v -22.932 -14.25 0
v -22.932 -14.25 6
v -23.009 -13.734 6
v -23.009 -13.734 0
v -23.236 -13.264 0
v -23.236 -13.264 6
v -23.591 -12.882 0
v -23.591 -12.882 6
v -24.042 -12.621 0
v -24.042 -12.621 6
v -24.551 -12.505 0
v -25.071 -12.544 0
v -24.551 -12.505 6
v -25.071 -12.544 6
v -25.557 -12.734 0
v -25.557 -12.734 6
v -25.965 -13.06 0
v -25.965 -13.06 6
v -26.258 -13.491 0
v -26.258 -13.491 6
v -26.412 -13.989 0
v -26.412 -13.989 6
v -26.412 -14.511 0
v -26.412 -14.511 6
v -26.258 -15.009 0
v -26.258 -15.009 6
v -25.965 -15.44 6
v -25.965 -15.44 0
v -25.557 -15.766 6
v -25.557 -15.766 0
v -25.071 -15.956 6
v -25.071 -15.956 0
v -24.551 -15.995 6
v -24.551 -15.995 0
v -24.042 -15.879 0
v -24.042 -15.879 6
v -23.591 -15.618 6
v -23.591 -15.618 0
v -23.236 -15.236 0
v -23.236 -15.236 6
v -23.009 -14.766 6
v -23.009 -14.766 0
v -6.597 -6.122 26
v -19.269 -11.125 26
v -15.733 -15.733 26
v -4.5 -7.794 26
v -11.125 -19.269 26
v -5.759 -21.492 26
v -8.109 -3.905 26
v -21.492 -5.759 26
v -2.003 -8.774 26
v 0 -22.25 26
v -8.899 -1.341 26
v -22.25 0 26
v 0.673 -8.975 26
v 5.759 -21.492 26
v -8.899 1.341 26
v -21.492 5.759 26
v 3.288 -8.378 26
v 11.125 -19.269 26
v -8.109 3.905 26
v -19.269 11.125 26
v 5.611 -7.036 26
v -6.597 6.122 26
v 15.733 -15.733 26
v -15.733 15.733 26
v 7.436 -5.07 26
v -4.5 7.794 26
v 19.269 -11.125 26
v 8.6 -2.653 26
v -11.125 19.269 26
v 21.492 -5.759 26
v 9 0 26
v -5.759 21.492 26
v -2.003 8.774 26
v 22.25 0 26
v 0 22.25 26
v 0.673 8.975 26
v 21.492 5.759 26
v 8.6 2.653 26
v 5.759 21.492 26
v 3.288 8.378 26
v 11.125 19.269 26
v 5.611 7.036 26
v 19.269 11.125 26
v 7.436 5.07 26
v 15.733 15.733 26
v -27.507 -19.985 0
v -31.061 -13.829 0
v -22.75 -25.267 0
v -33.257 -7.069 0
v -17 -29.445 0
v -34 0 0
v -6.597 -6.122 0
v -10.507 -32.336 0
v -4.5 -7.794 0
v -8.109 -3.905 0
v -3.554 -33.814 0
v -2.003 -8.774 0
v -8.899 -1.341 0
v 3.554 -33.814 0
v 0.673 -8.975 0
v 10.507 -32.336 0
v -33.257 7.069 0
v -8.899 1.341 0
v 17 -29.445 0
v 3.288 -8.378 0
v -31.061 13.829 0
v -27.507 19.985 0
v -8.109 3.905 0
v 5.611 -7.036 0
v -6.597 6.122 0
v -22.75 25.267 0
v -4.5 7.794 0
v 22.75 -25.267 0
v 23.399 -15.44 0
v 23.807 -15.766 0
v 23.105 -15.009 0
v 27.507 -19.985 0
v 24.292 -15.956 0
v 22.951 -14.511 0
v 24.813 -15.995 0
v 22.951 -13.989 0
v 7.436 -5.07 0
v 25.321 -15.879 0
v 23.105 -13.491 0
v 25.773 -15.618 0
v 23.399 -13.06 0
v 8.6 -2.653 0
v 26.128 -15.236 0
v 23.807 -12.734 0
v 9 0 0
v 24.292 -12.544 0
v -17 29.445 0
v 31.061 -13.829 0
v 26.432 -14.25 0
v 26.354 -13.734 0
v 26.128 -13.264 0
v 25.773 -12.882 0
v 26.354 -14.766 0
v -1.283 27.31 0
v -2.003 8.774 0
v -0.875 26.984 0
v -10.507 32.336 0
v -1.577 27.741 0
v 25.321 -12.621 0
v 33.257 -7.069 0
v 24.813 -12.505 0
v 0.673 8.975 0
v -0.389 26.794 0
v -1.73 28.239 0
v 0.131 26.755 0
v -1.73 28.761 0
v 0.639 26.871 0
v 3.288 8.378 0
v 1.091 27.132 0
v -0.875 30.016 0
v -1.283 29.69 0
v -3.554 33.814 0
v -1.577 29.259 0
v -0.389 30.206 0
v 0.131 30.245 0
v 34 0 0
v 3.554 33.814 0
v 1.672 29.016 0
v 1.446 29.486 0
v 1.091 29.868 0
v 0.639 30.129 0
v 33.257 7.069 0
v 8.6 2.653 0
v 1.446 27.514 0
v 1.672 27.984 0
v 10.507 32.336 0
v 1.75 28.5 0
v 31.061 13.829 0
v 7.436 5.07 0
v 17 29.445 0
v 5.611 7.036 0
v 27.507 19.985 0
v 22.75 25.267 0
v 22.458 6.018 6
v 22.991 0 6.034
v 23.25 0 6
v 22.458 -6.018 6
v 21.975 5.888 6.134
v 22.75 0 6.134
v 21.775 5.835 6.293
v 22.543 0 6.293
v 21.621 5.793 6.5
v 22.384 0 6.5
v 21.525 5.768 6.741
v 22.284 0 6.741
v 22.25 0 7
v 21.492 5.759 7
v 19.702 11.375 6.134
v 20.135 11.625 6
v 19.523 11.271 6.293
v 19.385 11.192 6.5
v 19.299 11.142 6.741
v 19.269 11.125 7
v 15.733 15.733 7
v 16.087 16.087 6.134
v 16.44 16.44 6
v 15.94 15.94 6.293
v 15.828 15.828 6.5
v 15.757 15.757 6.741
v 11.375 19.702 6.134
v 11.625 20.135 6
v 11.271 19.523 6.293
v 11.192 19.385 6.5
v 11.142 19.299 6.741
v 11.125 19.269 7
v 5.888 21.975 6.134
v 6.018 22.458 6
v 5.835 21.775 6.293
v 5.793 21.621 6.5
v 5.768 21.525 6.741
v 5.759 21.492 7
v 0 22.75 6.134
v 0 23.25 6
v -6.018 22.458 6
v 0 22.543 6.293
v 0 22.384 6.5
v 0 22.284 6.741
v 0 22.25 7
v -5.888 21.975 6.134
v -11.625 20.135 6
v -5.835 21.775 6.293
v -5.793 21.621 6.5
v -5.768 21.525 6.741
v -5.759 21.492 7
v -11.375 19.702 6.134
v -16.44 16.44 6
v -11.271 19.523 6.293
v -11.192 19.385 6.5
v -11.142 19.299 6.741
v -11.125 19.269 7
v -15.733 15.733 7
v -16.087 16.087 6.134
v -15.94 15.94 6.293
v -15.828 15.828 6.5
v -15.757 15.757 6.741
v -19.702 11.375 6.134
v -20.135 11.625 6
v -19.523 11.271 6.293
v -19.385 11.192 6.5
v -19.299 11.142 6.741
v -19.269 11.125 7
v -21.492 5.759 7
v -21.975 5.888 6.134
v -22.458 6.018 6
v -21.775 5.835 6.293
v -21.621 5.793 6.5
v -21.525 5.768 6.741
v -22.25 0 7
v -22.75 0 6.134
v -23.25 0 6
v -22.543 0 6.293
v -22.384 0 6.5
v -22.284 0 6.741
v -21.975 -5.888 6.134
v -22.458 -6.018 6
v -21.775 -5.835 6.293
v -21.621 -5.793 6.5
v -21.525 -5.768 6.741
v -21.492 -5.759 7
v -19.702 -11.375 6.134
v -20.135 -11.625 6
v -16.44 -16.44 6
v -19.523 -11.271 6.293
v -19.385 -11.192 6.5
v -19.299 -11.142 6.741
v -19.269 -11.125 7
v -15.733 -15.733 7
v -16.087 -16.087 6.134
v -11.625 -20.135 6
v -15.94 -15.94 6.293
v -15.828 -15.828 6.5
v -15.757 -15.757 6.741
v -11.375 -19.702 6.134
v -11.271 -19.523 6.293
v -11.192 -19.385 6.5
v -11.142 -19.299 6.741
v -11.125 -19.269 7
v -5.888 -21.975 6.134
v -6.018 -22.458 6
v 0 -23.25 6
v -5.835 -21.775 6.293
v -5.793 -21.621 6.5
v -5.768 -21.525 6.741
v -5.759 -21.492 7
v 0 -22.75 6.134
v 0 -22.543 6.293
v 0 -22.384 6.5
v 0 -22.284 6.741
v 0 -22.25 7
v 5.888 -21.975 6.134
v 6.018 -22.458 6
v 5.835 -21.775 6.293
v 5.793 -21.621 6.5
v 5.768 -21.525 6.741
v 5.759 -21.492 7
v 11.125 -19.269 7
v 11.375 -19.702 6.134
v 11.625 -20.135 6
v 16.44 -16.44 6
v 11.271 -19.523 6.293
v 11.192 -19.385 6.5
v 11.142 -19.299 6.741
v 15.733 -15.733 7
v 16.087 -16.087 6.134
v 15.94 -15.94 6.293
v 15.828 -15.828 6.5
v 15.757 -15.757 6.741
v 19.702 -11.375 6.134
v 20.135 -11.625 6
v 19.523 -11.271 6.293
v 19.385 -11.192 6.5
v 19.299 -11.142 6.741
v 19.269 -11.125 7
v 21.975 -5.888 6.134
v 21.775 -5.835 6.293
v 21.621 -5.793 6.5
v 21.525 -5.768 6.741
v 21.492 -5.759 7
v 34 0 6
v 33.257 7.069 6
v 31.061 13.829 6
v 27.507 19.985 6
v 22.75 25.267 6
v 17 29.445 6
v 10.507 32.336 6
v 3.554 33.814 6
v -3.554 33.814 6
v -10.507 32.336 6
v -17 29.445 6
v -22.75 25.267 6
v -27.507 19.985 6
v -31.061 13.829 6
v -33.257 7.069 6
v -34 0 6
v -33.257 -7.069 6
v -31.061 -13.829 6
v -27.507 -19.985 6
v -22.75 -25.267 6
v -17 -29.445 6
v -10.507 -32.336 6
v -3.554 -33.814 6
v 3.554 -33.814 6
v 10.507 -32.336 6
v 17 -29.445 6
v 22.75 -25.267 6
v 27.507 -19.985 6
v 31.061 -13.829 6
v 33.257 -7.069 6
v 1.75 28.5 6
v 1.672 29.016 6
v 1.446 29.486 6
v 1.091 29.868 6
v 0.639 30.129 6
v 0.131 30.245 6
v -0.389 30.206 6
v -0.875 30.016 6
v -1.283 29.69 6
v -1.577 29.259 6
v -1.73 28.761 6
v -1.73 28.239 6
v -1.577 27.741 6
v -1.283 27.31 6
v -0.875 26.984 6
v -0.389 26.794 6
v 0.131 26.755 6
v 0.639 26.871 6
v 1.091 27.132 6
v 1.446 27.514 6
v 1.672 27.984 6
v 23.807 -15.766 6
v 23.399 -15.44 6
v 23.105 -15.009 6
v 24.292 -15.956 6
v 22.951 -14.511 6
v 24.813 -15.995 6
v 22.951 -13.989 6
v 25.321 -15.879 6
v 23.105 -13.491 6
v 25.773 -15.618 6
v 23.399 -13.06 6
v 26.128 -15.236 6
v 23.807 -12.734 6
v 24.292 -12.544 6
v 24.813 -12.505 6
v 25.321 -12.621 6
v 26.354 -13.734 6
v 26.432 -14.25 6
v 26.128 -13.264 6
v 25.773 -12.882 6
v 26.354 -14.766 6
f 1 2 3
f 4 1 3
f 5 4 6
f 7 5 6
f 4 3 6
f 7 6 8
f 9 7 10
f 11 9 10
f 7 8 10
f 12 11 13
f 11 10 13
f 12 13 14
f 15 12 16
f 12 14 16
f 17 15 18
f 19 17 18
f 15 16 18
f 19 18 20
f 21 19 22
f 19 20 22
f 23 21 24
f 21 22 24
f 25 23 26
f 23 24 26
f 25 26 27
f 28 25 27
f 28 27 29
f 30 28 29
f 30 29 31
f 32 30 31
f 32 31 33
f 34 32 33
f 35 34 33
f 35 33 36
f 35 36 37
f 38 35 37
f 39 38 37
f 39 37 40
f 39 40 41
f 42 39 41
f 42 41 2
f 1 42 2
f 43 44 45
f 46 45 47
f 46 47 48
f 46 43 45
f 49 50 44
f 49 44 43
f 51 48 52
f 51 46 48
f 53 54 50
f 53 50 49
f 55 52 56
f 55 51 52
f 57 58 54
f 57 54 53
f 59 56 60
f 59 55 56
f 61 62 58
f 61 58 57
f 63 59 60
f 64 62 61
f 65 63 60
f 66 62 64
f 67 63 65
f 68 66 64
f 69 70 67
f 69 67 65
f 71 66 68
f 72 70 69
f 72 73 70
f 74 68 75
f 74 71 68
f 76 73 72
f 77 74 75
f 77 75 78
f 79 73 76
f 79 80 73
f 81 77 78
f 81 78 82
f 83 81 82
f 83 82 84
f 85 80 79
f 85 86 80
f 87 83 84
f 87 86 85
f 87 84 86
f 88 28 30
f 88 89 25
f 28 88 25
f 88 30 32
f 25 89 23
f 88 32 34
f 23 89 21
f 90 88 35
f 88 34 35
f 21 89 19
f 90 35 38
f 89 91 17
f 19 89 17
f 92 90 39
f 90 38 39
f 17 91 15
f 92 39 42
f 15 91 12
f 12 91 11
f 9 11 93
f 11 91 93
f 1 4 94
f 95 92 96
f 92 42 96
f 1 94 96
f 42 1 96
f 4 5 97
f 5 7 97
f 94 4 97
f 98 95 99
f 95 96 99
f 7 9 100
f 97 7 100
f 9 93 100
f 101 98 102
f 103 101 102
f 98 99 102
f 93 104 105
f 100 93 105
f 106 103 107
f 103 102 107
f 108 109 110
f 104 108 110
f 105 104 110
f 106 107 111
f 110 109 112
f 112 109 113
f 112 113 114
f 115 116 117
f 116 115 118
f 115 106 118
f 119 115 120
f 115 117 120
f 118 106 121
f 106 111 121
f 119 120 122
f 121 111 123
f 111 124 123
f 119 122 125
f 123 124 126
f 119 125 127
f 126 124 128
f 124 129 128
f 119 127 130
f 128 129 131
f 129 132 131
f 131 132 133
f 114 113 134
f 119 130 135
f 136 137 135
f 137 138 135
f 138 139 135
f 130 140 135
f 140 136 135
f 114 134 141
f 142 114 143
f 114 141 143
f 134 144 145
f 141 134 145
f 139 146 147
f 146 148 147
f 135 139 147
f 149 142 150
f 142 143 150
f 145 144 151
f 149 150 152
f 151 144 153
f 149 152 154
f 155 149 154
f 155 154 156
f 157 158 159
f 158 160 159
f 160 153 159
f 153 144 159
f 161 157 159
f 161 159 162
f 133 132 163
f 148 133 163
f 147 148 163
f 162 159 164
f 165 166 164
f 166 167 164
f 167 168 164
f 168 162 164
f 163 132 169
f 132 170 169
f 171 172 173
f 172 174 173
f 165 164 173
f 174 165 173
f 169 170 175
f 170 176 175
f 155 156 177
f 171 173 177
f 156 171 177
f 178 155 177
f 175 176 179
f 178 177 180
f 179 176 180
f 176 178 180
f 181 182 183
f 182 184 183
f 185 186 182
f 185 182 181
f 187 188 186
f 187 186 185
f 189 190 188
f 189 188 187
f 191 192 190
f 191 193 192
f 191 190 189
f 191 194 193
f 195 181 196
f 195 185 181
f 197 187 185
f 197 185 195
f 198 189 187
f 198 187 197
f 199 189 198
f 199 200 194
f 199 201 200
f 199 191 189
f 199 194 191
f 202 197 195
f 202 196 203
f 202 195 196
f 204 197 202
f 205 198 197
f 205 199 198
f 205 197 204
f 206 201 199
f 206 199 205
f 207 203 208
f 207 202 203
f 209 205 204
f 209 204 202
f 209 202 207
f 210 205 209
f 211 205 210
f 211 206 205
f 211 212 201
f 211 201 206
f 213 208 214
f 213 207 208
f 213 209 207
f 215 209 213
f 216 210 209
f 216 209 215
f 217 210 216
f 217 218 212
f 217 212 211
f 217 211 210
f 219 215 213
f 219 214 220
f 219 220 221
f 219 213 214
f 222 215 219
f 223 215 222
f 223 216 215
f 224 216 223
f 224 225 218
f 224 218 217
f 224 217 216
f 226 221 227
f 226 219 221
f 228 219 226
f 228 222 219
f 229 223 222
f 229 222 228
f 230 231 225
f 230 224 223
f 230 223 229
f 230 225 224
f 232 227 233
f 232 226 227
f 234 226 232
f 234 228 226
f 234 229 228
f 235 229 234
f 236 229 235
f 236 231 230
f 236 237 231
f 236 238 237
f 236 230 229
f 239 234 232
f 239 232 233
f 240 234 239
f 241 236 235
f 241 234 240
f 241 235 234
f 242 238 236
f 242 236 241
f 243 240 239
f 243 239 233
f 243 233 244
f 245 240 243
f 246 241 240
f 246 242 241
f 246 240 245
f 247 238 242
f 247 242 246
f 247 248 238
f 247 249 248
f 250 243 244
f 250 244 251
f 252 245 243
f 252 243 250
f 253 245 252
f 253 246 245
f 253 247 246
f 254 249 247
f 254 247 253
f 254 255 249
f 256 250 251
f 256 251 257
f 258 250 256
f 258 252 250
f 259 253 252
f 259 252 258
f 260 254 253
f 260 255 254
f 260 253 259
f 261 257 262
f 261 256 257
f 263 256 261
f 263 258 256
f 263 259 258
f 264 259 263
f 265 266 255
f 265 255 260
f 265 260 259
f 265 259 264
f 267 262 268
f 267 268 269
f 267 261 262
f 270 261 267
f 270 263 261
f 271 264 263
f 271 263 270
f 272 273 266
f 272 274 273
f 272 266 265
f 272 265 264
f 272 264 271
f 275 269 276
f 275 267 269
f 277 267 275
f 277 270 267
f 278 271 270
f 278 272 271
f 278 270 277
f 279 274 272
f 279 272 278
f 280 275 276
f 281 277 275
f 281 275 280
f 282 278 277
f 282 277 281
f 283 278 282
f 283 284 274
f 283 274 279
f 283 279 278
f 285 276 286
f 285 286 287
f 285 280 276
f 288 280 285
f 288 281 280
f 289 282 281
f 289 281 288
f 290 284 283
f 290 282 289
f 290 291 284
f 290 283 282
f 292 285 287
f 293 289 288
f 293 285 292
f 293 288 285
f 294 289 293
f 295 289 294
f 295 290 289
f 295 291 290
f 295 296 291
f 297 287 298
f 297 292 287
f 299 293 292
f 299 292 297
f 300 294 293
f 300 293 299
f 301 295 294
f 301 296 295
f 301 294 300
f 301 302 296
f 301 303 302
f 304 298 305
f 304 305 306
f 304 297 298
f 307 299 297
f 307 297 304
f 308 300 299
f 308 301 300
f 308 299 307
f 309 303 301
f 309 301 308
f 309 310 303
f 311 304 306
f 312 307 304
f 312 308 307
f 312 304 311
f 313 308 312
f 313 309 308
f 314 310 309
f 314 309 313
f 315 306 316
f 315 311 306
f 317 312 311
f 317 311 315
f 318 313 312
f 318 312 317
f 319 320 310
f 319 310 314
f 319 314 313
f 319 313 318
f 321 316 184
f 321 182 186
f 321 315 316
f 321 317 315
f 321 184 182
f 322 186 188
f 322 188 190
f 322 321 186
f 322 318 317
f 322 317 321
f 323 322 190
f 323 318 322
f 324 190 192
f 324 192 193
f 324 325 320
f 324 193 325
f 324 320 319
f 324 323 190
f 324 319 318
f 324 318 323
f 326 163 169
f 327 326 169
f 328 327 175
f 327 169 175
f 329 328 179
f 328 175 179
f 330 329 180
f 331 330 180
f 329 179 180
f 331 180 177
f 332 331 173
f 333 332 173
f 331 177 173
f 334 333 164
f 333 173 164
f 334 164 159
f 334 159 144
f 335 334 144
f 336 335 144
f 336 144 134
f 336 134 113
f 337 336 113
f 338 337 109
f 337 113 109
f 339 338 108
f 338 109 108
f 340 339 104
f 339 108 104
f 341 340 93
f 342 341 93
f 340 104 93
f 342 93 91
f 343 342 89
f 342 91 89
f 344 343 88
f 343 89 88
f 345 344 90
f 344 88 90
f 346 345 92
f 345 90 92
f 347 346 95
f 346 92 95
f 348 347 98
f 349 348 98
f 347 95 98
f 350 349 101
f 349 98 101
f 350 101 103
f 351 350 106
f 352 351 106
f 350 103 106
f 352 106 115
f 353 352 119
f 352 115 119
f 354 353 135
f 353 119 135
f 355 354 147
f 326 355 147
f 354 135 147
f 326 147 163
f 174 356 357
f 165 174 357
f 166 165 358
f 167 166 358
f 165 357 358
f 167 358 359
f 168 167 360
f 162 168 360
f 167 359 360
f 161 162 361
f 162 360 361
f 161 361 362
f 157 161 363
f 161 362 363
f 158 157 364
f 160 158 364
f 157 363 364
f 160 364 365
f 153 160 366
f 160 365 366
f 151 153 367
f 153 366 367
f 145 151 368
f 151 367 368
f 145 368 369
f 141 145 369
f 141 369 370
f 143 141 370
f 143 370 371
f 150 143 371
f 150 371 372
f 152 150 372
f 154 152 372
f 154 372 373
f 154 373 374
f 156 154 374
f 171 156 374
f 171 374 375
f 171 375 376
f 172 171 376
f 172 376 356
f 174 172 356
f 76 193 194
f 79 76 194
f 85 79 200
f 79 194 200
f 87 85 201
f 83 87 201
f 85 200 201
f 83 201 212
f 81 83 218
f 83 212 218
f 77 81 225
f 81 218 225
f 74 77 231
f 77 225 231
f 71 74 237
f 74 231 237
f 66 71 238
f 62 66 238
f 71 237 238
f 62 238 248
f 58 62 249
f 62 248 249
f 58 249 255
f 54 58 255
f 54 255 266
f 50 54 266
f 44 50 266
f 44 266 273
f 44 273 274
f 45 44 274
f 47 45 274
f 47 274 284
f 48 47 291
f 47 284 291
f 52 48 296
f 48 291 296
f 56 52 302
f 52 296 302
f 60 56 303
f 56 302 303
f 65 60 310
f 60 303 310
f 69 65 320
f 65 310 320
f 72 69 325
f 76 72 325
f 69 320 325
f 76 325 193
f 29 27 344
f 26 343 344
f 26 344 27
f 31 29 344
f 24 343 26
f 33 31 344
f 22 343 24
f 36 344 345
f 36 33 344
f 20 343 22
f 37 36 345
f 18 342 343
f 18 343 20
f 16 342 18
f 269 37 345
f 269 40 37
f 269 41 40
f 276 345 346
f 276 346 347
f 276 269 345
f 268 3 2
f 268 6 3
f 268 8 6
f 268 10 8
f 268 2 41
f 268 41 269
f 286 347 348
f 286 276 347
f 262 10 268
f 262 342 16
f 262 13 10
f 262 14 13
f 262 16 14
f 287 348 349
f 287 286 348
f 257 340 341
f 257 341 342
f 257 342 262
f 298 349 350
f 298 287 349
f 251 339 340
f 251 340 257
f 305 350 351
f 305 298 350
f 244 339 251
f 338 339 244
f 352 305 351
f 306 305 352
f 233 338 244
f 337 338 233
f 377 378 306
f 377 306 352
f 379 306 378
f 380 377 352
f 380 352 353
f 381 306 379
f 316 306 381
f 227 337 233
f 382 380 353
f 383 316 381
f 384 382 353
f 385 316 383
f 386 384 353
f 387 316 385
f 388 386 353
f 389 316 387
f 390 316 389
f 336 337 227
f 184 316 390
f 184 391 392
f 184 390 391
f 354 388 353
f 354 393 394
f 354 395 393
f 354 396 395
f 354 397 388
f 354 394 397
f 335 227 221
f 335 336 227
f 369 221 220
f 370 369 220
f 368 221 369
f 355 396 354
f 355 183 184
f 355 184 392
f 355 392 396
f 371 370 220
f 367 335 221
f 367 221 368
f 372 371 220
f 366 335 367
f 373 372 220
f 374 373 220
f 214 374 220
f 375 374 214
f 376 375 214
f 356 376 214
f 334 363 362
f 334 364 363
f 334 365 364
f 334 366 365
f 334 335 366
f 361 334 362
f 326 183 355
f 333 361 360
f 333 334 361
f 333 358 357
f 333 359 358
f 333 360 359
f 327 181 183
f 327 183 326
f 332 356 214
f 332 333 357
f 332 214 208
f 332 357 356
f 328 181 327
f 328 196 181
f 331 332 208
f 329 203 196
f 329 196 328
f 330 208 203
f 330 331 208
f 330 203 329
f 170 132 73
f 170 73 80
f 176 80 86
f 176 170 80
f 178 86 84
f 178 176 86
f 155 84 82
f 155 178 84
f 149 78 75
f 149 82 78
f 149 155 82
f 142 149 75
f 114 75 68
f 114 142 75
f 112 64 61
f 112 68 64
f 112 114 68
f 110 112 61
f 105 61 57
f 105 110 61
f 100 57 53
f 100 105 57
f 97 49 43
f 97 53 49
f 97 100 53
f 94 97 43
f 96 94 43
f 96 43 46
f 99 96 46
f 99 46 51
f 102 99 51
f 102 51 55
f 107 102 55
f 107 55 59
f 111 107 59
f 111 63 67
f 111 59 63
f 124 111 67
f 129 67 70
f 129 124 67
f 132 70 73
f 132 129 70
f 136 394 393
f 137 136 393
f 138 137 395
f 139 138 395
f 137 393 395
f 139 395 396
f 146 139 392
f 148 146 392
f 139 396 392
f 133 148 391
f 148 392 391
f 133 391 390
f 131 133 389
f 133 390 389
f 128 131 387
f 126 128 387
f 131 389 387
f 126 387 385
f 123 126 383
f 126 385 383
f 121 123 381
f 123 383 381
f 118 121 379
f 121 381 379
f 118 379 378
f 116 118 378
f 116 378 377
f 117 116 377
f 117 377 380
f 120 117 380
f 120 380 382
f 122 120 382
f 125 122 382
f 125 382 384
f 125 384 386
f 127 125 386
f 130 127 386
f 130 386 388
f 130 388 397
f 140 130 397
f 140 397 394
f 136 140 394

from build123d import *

# Parameters (mm, degrees)
SKETCH_1_R                 = 34
EXTRUDE_252_DEPTH          = 6
SKETCH_2_R                 = 22.25
EXTRUDE_346_DEPTH          = 20
SKETCH_4_R                 = 1.75
CUT_EXTRUDE_656_DEPTH      = 53.076866265
FILLET_1_R                 = 1
CUT_EXTRUDE_770_DEPTH      = 55.662601475
CUT_EXTRUDE_770_DEPTH_BACK = 55.662601475
SKETCH_3_R                 = 9


with BuildPart() as part:
    # 草图1 → Extrude 252 (new body)
    with BuildSketch(Plane.XY):
        Circle(SKETCH_1_R)
    extrude(amount=EXTRUDE_252_DEPTH)

    # 草图2 → Extrude 346 (add)
    with BuildSketch(Plane.XY.offset(6)):
        Circle(SKETCH_2_R)
    extrude(amount=EXTRUDE_346_DEPTH)

    # 草图4 → Cut-Extrude 656 (cut, through all)
    with BuildSketch(Plane.XY.offset(6)):
        with Locations((0, 28.5)):
            Circle(SKETCH_4_R)
        with Locations((24.681724008, -14.25)):
            Circle(SKETCH_4_R)
        with Locations((-24.681724008, -14.25)):
            Circle(SKETCH_4_R)
    extrude(amount=-CUT_EXTRUDE_656_DEPTH, mode=Mode.SUBTRACT)

    # 圆角1
    fillet_1_edges = [part.edges().sort_by_distance(p)[0] for p in [
        (-22.25, 0, 6),
    ]]
    fillet(fillet_1_edges, radius=FILLET_1_R)

    # 草图3 → Cut-Extrude 770 (cut, two sides: drawn at the far end of the back side and taken through both)
    with BuildSketch(Plane.XY.offset(26).offset(-CUT_EXTRUDE_770_DEPTH_BACK)):
        Circle(SKETCH_3_R)
    extrude(amount=CUT_EXTRUDE_770_DEPTH + CUT_EXTRUDE_770_DEPTH_BACK, mode=Mode.SUBTRACT)


solid = part.part
